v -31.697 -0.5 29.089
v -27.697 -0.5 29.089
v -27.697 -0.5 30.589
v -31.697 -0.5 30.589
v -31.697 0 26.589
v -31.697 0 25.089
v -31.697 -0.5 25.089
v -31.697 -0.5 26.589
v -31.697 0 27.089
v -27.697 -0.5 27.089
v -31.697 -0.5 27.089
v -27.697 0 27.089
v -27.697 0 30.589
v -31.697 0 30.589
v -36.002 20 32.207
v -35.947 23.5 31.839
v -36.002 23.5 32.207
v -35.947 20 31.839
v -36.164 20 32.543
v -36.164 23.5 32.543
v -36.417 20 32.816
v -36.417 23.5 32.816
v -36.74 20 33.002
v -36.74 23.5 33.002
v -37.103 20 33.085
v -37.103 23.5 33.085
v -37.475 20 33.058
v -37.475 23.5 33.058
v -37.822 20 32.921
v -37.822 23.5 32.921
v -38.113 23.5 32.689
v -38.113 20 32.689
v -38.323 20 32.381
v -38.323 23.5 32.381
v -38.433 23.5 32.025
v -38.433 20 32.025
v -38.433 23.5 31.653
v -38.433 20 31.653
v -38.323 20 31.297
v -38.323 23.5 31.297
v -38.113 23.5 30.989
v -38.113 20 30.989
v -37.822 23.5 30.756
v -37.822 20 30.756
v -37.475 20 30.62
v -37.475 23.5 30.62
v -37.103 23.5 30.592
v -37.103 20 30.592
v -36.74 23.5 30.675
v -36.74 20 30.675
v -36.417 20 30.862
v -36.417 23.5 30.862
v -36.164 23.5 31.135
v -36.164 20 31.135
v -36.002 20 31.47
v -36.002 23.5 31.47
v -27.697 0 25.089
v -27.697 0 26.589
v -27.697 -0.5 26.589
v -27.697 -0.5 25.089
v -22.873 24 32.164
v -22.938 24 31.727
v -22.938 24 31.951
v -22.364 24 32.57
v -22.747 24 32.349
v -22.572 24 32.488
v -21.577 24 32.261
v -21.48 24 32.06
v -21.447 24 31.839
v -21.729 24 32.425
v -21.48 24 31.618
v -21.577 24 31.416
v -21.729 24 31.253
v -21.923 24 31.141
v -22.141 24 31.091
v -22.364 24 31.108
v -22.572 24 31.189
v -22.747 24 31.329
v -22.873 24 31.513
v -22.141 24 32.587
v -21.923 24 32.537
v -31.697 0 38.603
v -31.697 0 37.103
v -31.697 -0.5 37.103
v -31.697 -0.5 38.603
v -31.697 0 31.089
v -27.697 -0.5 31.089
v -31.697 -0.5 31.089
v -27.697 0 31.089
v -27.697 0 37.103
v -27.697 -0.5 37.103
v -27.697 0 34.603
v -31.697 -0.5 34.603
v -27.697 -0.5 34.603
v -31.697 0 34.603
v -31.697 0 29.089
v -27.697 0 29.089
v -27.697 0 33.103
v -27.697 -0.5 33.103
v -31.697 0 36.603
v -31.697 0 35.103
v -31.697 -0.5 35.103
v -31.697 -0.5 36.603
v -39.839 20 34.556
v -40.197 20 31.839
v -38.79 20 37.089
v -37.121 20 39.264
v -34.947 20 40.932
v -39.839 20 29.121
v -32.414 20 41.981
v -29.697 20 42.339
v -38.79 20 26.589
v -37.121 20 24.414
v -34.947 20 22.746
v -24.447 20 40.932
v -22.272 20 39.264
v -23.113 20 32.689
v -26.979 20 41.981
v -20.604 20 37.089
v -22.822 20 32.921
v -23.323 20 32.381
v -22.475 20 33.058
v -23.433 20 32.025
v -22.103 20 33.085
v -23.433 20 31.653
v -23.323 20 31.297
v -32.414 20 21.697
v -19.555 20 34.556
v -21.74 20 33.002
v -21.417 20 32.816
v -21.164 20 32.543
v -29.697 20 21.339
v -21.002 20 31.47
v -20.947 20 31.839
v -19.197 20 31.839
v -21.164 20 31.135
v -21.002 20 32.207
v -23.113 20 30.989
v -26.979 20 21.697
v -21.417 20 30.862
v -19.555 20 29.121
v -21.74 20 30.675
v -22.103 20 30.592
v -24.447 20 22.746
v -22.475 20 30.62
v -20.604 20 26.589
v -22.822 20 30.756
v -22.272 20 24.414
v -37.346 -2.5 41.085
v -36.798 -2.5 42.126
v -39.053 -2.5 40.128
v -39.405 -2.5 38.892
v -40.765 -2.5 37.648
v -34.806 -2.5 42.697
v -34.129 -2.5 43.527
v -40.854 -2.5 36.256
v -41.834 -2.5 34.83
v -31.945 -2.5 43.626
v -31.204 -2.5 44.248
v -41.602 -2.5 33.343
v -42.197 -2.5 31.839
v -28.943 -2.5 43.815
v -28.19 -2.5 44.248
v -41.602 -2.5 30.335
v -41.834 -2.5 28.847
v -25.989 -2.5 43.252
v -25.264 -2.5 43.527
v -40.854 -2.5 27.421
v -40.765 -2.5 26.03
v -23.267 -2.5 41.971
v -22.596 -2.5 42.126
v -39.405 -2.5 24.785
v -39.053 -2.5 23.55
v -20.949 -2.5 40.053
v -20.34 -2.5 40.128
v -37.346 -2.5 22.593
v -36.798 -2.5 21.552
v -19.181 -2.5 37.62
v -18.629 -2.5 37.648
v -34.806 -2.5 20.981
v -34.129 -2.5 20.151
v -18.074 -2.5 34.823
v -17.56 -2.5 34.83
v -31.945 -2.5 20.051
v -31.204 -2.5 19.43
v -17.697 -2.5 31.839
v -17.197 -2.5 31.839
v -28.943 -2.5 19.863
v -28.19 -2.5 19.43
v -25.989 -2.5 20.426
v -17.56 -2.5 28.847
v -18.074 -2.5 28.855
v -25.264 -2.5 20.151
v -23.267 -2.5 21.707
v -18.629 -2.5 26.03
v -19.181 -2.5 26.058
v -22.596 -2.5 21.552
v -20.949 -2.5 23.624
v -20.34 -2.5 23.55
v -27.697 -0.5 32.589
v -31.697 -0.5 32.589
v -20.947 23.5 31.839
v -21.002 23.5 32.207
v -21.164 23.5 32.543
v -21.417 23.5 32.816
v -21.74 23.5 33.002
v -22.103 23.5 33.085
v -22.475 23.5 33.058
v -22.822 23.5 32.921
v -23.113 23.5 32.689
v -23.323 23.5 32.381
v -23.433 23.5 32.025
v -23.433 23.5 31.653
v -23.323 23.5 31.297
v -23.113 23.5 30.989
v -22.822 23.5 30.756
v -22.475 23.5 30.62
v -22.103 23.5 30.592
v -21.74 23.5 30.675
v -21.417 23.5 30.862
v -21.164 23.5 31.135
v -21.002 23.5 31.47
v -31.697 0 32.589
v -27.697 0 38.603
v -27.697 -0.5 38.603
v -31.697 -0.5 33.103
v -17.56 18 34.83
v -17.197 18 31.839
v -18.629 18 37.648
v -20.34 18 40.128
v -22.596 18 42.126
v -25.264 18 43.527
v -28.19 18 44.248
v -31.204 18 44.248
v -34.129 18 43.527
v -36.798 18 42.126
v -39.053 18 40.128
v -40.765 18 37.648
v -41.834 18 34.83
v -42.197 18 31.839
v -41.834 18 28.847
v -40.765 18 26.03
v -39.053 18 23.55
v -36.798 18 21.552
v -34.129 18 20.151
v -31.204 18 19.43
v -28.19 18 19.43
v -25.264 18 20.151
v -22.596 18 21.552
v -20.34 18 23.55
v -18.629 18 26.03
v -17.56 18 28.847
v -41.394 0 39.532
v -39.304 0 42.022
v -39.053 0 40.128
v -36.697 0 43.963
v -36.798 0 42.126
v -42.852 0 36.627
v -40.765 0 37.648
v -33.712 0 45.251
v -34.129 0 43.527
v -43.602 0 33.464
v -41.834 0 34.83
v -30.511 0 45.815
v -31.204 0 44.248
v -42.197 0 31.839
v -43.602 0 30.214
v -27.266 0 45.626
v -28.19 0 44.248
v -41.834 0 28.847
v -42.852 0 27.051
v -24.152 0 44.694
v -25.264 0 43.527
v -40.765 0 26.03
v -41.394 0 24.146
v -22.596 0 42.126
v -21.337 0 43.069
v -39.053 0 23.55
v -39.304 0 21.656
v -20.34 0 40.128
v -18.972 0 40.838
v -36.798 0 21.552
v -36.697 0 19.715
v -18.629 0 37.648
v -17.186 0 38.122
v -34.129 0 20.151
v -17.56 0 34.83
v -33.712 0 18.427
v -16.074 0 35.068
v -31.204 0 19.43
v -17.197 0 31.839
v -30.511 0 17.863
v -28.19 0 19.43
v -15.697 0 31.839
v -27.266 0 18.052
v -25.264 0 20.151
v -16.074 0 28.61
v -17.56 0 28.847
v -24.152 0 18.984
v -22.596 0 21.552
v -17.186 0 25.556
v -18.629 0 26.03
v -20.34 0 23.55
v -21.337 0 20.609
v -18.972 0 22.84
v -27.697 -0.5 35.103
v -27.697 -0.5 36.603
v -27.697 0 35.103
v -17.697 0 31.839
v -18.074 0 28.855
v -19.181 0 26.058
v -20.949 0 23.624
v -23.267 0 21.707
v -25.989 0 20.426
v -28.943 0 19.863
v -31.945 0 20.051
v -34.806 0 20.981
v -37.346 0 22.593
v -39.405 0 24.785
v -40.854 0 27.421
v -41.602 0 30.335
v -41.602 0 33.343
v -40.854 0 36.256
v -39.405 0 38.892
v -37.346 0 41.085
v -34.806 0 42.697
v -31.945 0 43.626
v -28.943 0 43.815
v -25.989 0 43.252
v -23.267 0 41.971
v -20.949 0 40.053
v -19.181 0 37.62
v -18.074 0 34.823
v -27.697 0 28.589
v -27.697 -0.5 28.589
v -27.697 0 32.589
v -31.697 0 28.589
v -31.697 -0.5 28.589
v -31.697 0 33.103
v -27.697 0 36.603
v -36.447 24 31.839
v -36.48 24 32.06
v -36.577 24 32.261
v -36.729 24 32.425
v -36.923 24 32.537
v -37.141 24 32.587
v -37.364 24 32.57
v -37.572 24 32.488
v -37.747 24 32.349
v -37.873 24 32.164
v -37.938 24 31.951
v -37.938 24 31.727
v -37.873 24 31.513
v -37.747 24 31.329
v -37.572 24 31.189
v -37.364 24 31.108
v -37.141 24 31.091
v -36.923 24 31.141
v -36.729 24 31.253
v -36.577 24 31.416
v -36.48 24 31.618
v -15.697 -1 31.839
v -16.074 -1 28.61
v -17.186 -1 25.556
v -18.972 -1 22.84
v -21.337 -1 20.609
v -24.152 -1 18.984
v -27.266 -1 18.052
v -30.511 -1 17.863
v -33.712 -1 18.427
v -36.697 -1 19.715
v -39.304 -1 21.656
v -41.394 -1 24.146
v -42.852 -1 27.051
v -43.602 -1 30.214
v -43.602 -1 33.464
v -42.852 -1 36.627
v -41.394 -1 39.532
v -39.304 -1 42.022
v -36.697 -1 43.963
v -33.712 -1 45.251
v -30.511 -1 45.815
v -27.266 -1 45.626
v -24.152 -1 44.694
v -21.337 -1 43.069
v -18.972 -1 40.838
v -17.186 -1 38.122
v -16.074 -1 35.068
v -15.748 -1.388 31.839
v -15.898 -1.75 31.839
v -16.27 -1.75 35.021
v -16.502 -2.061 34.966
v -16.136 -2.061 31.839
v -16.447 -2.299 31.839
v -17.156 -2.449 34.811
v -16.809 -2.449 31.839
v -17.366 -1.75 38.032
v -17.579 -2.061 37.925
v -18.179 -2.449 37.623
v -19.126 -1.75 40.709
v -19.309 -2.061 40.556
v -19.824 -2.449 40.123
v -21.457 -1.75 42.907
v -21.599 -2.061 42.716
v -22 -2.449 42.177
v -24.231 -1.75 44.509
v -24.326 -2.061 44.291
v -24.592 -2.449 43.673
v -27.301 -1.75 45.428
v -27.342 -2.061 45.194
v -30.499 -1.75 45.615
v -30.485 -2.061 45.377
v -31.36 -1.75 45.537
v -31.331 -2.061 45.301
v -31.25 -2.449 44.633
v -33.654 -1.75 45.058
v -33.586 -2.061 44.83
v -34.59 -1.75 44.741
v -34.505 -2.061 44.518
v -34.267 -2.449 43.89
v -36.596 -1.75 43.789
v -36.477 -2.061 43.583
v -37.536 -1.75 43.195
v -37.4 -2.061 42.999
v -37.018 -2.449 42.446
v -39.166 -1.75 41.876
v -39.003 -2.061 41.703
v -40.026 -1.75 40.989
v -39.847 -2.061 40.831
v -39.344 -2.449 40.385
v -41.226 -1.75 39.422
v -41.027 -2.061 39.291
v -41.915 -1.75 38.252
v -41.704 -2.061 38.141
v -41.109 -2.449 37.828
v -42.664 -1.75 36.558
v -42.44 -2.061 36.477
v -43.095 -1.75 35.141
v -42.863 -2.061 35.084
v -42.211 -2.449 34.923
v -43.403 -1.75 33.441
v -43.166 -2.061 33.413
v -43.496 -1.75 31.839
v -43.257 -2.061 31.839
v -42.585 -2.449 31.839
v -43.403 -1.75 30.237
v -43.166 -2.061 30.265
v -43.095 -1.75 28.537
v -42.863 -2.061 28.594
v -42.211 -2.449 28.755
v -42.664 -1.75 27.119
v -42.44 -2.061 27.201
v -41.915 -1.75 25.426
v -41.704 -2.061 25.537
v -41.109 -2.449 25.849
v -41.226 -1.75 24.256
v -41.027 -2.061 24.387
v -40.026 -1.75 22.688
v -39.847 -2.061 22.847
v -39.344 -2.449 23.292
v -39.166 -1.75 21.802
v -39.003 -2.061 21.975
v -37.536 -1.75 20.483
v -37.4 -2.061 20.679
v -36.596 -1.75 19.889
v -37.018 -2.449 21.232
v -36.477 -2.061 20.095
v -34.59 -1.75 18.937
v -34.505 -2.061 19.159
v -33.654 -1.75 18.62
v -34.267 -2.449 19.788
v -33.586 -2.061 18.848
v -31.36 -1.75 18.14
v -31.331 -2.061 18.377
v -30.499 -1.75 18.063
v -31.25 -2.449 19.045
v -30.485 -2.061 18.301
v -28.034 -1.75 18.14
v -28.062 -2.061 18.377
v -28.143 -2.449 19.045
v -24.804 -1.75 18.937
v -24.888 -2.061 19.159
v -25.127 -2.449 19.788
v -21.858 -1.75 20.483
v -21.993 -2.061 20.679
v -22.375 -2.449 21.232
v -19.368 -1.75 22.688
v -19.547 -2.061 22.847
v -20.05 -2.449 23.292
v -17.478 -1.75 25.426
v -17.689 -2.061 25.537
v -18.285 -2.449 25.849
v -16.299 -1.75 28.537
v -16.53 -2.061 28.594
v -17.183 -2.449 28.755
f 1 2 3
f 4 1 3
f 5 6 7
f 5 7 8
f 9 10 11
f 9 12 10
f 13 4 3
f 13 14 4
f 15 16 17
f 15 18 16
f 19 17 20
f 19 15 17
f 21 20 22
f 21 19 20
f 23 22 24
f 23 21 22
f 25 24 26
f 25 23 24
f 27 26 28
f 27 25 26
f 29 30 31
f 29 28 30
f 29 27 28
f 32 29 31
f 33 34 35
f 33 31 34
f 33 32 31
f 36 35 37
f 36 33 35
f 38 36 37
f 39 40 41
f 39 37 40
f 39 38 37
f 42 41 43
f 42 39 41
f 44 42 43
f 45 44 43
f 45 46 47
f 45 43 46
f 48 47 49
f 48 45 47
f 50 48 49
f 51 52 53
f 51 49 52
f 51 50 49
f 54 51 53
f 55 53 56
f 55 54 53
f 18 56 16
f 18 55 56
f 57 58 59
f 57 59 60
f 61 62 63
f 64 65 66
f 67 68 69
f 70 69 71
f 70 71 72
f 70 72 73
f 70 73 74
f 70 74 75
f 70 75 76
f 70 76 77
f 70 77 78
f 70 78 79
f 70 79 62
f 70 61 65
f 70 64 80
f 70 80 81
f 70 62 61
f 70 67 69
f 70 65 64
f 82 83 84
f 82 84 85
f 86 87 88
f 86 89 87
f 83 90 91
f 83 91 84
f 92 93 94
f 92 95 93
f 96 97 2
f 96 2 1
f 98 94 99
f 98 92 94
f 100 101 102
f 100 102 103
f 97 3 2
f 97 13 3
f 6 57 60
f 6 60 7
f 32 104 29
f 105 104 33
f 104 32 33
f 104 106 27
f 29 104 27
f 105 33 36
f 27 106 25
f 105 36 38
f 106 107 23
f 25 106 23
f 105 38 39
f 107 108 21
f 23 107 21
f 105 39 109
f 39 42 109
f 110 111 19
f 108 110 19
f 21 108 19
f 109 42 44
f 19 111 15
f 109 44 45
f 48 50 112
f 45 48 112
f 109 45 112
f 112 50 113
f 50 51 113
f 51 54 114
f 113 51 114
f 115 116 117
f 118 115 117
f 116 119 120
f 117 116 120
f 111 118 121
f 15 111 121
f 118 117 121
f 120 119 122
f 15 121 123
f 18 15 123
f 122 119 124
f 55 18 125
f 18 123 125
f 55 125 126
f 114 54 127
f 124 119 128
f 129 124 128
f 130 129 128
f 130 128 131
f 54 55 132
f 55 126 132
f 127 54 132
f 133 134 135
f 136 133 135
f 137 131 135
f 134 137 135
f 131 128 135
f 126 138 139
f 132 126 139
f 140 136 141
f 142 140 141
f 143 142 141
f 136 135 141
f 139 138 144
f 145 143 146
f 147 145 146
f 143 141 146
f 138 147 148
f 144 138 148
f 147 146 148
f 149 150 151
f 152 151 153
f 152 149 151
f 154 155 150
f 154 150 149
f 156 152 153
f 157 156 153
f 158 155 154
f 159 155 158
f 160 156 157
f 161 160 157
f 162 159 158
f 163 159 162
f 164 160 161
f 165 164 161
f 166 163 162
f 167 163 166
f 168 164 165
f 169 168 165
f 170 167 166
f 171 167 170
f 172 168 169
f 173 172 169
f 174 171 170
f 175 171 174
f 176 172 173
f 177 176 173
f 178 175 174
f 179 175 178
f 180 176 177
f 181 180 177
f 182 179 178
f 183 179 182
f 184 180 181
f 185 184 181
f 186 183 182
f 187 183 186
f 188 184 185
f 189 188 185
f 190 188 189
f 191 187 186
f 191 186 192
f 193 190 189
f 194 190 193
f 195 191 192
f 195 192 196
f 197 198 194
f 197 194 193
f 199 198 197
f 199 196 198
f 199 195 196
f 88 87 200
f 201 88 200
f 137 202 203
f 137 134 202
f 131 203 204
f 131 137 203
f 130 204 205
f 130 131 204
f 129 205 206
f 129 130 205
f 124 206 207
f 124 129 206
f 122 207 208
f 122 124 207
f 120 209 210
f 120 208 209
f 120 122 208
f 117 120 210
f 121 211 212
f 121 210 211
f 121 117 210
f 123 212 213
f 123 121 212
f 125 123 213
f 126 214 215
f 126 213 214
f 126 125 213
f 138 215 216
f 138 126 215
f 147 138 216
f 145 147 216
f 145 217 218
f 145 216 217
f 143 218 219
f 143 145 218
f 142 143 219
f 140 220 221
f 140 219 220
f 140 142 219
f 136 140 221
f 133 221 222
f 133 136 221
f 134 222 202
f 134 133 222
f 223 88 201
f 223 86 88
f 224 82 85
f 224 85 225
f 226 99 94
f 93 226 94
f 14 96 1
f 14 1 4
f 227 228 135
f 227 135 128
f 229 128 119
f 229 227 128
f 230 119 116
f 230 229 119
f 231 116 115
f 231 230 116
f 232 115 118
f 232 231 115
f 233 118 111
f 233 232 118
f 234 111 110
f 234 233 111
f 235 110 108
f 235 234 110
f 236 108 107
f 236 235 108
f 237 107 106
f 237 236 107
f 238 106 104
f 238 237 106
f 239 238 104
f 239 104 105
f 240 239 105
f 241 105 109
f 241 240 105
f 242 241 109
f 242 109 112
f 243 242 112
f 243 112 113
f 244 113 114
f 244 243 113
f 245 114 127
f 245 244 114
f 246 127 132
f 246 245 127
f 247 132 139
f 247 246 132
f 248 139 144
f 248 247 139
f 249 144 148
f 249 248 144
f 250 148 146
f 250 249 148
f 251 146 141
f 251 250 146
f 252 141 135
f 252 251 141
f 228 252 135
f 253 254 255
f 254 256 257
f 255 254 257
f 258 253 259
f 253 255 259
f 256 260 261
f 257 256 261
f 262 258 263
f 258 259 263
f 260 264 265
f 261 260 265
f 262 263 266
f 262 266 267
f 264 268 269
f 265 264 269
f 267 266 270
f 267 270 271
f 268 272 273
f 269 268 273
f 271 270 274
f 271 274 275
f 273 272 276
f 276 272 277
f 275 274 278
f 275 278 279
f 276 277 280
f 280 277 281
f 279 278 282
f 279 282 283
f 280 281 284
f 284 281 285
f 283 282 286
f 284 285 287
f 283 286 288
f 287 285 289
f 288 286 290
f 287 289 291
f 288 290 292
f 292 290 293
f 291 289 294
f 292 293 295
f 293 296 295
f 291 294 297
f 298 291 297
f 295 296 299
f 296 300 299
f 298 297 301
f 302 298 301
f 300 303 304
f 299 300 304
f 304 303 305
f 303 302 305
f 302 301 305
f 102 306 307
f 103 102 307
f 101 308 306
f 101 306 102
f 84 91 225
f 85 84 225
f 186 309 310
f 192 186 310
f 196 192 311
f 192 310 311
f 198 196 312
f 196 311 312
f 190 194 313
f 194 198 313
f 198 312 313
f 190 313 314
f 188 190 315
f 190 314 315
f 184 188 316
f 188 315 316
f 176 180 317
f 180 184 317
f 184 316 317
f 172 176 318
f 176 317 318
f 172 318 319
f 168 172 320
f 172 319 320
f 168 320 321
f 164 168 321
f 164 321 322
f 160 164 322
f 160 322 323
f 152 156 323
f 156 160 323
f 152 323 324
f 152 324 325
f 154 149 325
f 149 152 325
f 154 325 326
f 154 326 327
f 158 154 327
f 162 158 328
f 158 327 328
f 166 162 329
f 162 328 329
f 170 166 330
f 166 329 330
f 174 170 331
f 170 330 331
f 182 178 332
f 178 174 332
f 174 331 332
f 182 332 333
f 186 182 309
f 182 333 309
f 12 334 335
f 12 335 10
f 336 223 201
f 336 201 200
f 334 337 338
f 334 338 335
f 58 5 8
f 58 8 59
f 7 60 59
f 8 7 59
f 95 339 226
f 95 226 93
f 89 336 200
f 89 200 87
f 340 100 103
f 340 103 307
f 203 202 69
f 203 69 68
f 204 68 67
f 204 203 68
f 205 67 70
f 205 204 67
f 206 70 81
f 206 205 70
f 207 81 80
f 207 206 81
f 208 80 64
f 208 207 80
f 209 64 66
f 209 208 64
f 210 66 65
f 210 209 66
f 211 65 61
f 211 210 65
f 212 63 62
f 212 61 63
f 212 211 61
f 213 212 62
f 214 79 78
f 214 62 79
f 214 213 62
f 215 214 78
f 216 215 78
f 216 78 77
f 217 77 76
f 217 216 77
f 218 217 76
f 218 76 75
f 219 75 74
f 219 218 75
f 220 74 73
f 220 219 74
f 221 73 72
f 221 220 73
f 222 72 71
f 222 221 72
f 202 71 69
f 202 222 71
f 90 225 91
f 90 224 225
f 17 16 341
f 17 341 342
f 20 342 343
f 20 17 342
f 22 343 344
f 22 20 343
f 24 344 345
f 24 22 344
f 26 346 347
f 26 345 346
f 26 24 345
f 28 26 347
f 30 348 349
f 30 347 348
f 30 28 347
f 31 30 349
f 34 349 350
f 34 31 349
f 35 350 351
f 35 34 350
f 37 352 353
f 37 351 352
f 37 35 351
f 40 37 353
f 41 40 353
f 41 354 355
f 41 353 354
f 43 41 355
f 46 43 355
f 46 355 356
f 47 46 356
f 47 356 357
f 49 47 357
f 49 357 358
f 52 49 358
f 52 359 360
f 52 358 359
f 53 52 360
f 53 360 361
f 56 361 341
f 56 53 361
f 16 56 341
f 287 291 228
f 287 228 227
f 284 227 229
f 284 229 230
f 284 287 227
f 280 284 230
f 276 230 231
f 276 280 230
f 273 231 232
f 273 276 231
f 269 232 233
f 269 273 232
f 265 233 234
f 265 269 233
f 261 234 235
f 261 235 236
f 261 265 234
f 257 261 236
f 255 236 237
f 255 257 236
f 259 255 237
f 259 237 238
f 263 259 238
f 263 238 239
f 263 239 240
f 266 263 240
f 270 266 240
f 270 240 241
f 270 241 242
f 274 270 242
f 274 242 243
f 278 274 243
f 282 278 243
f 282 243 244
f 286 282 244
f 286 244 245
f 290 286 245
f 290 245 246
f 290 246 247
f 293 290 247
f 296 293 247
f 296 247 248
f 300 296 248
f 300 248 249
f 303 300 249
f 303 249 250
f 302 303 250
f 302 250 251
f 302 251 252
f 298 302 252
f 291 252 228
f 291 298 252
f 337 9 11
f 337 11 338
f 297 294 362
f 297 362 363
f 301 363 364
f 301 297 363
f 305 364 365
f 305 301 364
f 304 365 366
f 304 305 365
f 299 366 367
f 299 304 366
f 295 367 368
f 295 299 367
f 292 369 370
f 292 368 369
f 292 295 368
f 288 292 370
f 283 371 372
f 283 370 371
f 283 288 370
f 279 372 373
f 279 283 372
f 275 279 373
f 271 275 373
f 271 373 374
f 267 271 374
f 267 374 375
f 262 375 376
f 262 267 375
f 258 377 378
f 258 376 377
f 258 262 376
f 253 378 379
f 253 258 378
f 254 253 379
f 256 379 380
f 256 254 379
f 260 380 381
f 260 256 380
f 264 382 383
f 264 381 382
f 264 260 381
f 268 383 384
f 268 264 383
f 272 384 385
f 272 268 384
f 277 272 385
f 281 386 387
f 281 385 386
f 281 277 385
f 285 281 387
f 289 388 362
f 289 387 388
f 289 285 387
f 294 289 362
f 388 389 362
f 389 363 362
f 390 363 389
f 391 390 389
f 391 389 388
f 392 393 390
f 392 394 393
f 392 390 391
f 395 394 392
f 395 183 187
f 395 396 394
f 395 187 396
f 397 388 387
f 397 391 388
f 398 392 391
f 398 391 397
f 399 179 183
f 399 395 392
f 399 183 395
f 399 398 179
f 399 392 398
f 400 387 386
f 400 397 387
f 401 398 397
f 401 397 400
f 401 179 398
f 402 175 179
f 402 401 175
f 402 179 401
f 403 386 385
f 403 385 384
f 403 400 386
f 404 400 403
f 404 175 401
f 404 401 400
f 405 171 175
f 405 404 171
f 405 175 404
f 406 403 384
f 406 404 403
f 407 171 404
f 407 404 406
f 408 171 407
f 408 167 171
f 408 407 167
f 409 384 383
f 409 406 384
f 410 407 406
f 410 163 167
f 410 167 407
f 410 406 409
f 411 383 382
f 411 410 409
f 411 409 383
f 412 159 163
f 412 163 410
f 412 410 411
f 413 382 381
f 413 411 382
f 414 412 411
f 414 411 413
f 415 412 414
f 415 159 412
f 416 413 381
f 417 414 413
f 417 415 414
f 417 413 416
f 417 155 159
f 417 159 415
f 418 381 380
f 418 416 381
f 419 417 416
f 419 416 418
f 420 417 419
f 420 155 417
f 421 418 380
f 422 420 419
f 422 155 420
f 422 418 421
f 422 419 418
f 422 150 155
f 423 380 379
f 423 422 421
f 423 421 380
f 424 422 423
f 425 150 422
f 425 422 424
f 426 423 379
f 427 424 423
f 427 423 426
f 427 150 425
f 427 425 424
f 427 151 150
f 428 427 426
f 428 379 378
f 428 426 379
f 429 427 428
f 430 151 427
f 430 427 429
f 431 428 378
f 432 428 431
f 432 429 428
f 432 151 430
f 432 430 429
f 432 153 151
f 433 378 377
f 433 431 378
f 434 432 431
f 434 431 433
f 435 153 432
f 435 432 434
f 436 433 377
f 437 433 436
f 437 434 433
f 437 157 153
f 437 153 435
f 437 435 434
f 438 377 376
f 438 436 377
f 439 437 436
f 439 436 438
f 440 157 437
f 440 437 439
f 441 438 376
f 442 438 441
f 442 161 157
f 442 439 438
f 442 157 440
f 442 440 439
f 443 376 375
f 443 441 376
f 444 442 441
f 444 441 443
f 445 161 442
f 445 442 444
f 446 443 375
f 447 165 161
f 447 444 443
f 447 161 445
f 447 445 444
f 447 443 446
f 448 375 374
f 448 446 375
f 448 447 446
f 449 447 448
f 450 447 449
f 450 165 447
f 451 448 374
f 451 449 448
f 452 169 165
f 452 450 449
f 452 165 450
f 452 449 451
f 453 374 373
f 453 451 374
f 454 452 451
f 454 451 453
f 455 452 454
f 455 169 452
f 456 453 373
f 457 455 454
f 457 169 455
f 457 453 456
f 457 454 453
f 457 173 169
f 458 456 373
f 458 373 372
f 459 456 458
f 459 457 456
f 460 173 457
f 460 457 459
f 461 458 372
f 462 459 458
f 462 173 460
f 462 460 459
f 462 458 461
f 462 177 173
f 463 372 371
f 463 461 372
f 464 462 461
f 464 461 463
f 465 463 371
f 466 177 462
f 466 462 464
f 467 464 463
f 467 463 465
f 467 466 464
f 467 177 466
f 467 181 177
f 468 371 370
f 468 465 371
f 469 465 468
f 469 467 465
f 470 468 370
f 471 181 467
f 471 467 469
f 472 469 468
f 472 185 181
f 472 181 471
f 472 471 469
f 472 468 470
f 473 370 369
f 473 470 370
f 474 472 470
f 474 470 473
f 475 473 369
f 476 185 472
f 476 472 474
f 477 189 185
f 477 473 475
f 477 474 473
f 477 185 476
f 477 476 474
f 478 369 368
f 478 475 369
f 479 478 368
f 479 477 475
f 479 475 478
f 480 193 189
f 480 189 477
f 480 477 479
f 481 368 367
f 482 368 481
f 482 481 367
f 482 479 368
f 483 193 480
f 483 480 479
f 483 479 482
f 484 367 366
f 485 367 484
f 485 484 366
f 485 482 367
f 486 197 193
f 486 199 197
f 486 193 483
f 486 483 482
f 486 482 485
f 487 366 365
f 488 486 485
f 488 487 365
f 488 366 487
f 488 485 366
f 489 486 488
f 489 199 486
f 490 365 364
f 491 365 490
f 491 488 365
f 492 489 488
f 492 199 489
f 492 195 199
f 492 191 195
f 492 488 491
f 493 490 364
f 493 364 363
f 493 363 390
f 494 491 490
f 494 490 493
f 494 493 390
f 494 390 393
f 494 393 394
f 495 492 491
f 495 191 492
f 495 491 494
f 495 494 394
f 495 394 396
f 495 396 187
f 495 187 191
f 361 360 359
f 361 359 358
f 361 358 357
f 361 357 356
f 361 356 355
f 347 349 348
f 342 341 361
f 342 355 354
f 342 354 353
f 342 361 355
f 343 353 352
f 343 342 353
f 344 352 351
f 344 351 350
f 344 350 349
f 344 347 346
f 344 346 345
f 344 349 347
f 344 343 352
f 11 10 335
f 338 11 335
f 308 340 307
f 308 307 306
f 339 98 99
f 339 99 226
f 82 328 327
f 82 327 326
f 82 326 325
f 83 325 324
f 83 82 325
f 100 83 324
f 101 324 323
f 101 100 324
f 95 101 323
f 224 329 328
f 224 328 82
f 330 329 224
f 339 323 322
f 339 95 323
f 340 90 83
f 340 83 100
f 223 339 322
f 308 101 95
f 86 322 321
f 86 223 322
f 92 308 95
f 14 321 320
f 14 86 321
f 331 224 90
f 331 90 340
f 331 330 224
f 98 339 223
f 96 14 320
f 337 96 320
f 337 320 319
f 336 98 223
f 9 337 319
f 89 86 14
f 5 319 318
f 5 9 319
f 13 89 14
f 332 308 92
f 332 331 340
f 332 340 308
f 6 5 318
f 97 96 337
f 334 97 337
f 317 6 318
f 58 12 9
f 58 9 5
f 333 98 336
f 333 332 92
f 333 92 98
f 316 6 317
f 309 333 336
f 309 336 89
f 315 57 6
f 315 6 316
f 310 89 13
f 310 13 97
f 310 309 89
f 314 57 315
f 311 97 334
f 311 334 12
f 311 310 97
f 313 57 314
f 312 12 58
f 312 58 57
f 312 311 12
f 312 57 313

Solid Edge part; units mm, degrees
sketch "Sketch1" plane through (0, 0, 0) normal (0, -1, 0) x (1, 0, 0)
  circle A0 centre (-29.6968, 31.8389) radius 12.5
  dimension "D1" = 25
extrude "Protrusion1" add sketch "Sketch1" against normal blind 20
chamfer "Chamfer_1" distance 2 angle 45 1 edges at (-42.1968, 20, 31.8389)
sketch "Sketch2" plane through (-29.6968, 0, 31.8389) normal (0, -1, 0) x (1, 0, 0)
  circle A0 centre (0, 0) radius 14
  circle A1 centre (0, 0) radius 12
extrude "ExtrudedProtrusion_2" add sketch "Sketch2" along normal blind 2.5
fillet "Round_1" radius 1.5 1 edges at (-43.6968, -2.5, 31.8389)
sketch "Sketch3" plane through (-29.6968, 20, 31.8389) normal (0, 1, 0) x (1, 0, 0)
  circle A0 centre (7.5, 0) radius 1.25
  circle A1 centre (-7.5, 0) radius 1.25
  dimension "D1" = 7.5
  dimension "D2" = 7.5
  dimension "D3" = 2.5
  dimension "D4" = 2.5
extrude "ExtrudedProtrusion_3" add sketch "Sketch3" along normal blind 4
chamfer "Chamfer_2" distance 0.5 angle 45 2 edges at (-23.4468, 24, 31.8389) (-38.4468, 24, 31.8389)
sketch "Sketch4" plane through (-29.6968, 0, 31.8389) normal (0, -1, 0) x (-1, 0, 0)
  line L0 (-2, -1.2639) -> (2, -1.2639)
  line L1 (2, -1.2639) -> (2, -2.7639)
  line L2 (2, -2.7639) -> (-2, -2.7639)
  line L3 (-2, -2.7639) -> (-2, -1.2639)
  line L4 (-2, -3.2639) -> (2, -3.2639)
  line L5 (2, -3.2639) -> (2, -4.7639)
  line L6 (2, -4.7639) -> (-2, -4.7639)
  line L7 (-2, -4.7639) -> (-2, -3.2639)
  line L8 (-2, -5.2639) -> (2, -5.2639)
  line L9 (2, -5.2639) -> (2, -6.7639)
  line L10 (2, -6.7639) -> (-2, -6.7639)
  line L11 (-2, -6.7639) -> (-2, -5.2639)
  line L12 (-2, 2.75) -> (2, 2.75)
  line L13 (2, 2.75) -> (2, 1.25)
  line L14 (2, 1.25) -> (-2, 1.25)
  line L15 (-2, 1.25) -> (-2, 2.75)
  line L16 (-2, 4.75) -> (2, 4.75)
  line L17 (2, 4.75) -> (2, 3.25)
  line L18 (2, 3.25) -> (-2, 3.25)
  line L19 (-2, 3.25) -> (-2, 4.75)
  line L20 (-2, 6.75) -> (2, 6.75)
  line L21 (2, 6.75) -> (2, 5.25)
  line L22 (2, 5.25) -> (-2, 5.25)
  line L23 (-2, 5.25) -> (-2, 6.75)
  line L24 (-2, 0.75) -> (2, 0.75)
  line L25 (2, 0.75) -> (2, -0.75)
  line L26 (2, -0.75) -> (-2, -0.75)
  line L27 (-2, -0.75) -> (-2, 0.75)
  dimension "D1" = 1.5
  dimension "D2" = 4
extrude "ExtrudedProtrusion_4" add sketch "Sketch4" along normal blind 0.5
